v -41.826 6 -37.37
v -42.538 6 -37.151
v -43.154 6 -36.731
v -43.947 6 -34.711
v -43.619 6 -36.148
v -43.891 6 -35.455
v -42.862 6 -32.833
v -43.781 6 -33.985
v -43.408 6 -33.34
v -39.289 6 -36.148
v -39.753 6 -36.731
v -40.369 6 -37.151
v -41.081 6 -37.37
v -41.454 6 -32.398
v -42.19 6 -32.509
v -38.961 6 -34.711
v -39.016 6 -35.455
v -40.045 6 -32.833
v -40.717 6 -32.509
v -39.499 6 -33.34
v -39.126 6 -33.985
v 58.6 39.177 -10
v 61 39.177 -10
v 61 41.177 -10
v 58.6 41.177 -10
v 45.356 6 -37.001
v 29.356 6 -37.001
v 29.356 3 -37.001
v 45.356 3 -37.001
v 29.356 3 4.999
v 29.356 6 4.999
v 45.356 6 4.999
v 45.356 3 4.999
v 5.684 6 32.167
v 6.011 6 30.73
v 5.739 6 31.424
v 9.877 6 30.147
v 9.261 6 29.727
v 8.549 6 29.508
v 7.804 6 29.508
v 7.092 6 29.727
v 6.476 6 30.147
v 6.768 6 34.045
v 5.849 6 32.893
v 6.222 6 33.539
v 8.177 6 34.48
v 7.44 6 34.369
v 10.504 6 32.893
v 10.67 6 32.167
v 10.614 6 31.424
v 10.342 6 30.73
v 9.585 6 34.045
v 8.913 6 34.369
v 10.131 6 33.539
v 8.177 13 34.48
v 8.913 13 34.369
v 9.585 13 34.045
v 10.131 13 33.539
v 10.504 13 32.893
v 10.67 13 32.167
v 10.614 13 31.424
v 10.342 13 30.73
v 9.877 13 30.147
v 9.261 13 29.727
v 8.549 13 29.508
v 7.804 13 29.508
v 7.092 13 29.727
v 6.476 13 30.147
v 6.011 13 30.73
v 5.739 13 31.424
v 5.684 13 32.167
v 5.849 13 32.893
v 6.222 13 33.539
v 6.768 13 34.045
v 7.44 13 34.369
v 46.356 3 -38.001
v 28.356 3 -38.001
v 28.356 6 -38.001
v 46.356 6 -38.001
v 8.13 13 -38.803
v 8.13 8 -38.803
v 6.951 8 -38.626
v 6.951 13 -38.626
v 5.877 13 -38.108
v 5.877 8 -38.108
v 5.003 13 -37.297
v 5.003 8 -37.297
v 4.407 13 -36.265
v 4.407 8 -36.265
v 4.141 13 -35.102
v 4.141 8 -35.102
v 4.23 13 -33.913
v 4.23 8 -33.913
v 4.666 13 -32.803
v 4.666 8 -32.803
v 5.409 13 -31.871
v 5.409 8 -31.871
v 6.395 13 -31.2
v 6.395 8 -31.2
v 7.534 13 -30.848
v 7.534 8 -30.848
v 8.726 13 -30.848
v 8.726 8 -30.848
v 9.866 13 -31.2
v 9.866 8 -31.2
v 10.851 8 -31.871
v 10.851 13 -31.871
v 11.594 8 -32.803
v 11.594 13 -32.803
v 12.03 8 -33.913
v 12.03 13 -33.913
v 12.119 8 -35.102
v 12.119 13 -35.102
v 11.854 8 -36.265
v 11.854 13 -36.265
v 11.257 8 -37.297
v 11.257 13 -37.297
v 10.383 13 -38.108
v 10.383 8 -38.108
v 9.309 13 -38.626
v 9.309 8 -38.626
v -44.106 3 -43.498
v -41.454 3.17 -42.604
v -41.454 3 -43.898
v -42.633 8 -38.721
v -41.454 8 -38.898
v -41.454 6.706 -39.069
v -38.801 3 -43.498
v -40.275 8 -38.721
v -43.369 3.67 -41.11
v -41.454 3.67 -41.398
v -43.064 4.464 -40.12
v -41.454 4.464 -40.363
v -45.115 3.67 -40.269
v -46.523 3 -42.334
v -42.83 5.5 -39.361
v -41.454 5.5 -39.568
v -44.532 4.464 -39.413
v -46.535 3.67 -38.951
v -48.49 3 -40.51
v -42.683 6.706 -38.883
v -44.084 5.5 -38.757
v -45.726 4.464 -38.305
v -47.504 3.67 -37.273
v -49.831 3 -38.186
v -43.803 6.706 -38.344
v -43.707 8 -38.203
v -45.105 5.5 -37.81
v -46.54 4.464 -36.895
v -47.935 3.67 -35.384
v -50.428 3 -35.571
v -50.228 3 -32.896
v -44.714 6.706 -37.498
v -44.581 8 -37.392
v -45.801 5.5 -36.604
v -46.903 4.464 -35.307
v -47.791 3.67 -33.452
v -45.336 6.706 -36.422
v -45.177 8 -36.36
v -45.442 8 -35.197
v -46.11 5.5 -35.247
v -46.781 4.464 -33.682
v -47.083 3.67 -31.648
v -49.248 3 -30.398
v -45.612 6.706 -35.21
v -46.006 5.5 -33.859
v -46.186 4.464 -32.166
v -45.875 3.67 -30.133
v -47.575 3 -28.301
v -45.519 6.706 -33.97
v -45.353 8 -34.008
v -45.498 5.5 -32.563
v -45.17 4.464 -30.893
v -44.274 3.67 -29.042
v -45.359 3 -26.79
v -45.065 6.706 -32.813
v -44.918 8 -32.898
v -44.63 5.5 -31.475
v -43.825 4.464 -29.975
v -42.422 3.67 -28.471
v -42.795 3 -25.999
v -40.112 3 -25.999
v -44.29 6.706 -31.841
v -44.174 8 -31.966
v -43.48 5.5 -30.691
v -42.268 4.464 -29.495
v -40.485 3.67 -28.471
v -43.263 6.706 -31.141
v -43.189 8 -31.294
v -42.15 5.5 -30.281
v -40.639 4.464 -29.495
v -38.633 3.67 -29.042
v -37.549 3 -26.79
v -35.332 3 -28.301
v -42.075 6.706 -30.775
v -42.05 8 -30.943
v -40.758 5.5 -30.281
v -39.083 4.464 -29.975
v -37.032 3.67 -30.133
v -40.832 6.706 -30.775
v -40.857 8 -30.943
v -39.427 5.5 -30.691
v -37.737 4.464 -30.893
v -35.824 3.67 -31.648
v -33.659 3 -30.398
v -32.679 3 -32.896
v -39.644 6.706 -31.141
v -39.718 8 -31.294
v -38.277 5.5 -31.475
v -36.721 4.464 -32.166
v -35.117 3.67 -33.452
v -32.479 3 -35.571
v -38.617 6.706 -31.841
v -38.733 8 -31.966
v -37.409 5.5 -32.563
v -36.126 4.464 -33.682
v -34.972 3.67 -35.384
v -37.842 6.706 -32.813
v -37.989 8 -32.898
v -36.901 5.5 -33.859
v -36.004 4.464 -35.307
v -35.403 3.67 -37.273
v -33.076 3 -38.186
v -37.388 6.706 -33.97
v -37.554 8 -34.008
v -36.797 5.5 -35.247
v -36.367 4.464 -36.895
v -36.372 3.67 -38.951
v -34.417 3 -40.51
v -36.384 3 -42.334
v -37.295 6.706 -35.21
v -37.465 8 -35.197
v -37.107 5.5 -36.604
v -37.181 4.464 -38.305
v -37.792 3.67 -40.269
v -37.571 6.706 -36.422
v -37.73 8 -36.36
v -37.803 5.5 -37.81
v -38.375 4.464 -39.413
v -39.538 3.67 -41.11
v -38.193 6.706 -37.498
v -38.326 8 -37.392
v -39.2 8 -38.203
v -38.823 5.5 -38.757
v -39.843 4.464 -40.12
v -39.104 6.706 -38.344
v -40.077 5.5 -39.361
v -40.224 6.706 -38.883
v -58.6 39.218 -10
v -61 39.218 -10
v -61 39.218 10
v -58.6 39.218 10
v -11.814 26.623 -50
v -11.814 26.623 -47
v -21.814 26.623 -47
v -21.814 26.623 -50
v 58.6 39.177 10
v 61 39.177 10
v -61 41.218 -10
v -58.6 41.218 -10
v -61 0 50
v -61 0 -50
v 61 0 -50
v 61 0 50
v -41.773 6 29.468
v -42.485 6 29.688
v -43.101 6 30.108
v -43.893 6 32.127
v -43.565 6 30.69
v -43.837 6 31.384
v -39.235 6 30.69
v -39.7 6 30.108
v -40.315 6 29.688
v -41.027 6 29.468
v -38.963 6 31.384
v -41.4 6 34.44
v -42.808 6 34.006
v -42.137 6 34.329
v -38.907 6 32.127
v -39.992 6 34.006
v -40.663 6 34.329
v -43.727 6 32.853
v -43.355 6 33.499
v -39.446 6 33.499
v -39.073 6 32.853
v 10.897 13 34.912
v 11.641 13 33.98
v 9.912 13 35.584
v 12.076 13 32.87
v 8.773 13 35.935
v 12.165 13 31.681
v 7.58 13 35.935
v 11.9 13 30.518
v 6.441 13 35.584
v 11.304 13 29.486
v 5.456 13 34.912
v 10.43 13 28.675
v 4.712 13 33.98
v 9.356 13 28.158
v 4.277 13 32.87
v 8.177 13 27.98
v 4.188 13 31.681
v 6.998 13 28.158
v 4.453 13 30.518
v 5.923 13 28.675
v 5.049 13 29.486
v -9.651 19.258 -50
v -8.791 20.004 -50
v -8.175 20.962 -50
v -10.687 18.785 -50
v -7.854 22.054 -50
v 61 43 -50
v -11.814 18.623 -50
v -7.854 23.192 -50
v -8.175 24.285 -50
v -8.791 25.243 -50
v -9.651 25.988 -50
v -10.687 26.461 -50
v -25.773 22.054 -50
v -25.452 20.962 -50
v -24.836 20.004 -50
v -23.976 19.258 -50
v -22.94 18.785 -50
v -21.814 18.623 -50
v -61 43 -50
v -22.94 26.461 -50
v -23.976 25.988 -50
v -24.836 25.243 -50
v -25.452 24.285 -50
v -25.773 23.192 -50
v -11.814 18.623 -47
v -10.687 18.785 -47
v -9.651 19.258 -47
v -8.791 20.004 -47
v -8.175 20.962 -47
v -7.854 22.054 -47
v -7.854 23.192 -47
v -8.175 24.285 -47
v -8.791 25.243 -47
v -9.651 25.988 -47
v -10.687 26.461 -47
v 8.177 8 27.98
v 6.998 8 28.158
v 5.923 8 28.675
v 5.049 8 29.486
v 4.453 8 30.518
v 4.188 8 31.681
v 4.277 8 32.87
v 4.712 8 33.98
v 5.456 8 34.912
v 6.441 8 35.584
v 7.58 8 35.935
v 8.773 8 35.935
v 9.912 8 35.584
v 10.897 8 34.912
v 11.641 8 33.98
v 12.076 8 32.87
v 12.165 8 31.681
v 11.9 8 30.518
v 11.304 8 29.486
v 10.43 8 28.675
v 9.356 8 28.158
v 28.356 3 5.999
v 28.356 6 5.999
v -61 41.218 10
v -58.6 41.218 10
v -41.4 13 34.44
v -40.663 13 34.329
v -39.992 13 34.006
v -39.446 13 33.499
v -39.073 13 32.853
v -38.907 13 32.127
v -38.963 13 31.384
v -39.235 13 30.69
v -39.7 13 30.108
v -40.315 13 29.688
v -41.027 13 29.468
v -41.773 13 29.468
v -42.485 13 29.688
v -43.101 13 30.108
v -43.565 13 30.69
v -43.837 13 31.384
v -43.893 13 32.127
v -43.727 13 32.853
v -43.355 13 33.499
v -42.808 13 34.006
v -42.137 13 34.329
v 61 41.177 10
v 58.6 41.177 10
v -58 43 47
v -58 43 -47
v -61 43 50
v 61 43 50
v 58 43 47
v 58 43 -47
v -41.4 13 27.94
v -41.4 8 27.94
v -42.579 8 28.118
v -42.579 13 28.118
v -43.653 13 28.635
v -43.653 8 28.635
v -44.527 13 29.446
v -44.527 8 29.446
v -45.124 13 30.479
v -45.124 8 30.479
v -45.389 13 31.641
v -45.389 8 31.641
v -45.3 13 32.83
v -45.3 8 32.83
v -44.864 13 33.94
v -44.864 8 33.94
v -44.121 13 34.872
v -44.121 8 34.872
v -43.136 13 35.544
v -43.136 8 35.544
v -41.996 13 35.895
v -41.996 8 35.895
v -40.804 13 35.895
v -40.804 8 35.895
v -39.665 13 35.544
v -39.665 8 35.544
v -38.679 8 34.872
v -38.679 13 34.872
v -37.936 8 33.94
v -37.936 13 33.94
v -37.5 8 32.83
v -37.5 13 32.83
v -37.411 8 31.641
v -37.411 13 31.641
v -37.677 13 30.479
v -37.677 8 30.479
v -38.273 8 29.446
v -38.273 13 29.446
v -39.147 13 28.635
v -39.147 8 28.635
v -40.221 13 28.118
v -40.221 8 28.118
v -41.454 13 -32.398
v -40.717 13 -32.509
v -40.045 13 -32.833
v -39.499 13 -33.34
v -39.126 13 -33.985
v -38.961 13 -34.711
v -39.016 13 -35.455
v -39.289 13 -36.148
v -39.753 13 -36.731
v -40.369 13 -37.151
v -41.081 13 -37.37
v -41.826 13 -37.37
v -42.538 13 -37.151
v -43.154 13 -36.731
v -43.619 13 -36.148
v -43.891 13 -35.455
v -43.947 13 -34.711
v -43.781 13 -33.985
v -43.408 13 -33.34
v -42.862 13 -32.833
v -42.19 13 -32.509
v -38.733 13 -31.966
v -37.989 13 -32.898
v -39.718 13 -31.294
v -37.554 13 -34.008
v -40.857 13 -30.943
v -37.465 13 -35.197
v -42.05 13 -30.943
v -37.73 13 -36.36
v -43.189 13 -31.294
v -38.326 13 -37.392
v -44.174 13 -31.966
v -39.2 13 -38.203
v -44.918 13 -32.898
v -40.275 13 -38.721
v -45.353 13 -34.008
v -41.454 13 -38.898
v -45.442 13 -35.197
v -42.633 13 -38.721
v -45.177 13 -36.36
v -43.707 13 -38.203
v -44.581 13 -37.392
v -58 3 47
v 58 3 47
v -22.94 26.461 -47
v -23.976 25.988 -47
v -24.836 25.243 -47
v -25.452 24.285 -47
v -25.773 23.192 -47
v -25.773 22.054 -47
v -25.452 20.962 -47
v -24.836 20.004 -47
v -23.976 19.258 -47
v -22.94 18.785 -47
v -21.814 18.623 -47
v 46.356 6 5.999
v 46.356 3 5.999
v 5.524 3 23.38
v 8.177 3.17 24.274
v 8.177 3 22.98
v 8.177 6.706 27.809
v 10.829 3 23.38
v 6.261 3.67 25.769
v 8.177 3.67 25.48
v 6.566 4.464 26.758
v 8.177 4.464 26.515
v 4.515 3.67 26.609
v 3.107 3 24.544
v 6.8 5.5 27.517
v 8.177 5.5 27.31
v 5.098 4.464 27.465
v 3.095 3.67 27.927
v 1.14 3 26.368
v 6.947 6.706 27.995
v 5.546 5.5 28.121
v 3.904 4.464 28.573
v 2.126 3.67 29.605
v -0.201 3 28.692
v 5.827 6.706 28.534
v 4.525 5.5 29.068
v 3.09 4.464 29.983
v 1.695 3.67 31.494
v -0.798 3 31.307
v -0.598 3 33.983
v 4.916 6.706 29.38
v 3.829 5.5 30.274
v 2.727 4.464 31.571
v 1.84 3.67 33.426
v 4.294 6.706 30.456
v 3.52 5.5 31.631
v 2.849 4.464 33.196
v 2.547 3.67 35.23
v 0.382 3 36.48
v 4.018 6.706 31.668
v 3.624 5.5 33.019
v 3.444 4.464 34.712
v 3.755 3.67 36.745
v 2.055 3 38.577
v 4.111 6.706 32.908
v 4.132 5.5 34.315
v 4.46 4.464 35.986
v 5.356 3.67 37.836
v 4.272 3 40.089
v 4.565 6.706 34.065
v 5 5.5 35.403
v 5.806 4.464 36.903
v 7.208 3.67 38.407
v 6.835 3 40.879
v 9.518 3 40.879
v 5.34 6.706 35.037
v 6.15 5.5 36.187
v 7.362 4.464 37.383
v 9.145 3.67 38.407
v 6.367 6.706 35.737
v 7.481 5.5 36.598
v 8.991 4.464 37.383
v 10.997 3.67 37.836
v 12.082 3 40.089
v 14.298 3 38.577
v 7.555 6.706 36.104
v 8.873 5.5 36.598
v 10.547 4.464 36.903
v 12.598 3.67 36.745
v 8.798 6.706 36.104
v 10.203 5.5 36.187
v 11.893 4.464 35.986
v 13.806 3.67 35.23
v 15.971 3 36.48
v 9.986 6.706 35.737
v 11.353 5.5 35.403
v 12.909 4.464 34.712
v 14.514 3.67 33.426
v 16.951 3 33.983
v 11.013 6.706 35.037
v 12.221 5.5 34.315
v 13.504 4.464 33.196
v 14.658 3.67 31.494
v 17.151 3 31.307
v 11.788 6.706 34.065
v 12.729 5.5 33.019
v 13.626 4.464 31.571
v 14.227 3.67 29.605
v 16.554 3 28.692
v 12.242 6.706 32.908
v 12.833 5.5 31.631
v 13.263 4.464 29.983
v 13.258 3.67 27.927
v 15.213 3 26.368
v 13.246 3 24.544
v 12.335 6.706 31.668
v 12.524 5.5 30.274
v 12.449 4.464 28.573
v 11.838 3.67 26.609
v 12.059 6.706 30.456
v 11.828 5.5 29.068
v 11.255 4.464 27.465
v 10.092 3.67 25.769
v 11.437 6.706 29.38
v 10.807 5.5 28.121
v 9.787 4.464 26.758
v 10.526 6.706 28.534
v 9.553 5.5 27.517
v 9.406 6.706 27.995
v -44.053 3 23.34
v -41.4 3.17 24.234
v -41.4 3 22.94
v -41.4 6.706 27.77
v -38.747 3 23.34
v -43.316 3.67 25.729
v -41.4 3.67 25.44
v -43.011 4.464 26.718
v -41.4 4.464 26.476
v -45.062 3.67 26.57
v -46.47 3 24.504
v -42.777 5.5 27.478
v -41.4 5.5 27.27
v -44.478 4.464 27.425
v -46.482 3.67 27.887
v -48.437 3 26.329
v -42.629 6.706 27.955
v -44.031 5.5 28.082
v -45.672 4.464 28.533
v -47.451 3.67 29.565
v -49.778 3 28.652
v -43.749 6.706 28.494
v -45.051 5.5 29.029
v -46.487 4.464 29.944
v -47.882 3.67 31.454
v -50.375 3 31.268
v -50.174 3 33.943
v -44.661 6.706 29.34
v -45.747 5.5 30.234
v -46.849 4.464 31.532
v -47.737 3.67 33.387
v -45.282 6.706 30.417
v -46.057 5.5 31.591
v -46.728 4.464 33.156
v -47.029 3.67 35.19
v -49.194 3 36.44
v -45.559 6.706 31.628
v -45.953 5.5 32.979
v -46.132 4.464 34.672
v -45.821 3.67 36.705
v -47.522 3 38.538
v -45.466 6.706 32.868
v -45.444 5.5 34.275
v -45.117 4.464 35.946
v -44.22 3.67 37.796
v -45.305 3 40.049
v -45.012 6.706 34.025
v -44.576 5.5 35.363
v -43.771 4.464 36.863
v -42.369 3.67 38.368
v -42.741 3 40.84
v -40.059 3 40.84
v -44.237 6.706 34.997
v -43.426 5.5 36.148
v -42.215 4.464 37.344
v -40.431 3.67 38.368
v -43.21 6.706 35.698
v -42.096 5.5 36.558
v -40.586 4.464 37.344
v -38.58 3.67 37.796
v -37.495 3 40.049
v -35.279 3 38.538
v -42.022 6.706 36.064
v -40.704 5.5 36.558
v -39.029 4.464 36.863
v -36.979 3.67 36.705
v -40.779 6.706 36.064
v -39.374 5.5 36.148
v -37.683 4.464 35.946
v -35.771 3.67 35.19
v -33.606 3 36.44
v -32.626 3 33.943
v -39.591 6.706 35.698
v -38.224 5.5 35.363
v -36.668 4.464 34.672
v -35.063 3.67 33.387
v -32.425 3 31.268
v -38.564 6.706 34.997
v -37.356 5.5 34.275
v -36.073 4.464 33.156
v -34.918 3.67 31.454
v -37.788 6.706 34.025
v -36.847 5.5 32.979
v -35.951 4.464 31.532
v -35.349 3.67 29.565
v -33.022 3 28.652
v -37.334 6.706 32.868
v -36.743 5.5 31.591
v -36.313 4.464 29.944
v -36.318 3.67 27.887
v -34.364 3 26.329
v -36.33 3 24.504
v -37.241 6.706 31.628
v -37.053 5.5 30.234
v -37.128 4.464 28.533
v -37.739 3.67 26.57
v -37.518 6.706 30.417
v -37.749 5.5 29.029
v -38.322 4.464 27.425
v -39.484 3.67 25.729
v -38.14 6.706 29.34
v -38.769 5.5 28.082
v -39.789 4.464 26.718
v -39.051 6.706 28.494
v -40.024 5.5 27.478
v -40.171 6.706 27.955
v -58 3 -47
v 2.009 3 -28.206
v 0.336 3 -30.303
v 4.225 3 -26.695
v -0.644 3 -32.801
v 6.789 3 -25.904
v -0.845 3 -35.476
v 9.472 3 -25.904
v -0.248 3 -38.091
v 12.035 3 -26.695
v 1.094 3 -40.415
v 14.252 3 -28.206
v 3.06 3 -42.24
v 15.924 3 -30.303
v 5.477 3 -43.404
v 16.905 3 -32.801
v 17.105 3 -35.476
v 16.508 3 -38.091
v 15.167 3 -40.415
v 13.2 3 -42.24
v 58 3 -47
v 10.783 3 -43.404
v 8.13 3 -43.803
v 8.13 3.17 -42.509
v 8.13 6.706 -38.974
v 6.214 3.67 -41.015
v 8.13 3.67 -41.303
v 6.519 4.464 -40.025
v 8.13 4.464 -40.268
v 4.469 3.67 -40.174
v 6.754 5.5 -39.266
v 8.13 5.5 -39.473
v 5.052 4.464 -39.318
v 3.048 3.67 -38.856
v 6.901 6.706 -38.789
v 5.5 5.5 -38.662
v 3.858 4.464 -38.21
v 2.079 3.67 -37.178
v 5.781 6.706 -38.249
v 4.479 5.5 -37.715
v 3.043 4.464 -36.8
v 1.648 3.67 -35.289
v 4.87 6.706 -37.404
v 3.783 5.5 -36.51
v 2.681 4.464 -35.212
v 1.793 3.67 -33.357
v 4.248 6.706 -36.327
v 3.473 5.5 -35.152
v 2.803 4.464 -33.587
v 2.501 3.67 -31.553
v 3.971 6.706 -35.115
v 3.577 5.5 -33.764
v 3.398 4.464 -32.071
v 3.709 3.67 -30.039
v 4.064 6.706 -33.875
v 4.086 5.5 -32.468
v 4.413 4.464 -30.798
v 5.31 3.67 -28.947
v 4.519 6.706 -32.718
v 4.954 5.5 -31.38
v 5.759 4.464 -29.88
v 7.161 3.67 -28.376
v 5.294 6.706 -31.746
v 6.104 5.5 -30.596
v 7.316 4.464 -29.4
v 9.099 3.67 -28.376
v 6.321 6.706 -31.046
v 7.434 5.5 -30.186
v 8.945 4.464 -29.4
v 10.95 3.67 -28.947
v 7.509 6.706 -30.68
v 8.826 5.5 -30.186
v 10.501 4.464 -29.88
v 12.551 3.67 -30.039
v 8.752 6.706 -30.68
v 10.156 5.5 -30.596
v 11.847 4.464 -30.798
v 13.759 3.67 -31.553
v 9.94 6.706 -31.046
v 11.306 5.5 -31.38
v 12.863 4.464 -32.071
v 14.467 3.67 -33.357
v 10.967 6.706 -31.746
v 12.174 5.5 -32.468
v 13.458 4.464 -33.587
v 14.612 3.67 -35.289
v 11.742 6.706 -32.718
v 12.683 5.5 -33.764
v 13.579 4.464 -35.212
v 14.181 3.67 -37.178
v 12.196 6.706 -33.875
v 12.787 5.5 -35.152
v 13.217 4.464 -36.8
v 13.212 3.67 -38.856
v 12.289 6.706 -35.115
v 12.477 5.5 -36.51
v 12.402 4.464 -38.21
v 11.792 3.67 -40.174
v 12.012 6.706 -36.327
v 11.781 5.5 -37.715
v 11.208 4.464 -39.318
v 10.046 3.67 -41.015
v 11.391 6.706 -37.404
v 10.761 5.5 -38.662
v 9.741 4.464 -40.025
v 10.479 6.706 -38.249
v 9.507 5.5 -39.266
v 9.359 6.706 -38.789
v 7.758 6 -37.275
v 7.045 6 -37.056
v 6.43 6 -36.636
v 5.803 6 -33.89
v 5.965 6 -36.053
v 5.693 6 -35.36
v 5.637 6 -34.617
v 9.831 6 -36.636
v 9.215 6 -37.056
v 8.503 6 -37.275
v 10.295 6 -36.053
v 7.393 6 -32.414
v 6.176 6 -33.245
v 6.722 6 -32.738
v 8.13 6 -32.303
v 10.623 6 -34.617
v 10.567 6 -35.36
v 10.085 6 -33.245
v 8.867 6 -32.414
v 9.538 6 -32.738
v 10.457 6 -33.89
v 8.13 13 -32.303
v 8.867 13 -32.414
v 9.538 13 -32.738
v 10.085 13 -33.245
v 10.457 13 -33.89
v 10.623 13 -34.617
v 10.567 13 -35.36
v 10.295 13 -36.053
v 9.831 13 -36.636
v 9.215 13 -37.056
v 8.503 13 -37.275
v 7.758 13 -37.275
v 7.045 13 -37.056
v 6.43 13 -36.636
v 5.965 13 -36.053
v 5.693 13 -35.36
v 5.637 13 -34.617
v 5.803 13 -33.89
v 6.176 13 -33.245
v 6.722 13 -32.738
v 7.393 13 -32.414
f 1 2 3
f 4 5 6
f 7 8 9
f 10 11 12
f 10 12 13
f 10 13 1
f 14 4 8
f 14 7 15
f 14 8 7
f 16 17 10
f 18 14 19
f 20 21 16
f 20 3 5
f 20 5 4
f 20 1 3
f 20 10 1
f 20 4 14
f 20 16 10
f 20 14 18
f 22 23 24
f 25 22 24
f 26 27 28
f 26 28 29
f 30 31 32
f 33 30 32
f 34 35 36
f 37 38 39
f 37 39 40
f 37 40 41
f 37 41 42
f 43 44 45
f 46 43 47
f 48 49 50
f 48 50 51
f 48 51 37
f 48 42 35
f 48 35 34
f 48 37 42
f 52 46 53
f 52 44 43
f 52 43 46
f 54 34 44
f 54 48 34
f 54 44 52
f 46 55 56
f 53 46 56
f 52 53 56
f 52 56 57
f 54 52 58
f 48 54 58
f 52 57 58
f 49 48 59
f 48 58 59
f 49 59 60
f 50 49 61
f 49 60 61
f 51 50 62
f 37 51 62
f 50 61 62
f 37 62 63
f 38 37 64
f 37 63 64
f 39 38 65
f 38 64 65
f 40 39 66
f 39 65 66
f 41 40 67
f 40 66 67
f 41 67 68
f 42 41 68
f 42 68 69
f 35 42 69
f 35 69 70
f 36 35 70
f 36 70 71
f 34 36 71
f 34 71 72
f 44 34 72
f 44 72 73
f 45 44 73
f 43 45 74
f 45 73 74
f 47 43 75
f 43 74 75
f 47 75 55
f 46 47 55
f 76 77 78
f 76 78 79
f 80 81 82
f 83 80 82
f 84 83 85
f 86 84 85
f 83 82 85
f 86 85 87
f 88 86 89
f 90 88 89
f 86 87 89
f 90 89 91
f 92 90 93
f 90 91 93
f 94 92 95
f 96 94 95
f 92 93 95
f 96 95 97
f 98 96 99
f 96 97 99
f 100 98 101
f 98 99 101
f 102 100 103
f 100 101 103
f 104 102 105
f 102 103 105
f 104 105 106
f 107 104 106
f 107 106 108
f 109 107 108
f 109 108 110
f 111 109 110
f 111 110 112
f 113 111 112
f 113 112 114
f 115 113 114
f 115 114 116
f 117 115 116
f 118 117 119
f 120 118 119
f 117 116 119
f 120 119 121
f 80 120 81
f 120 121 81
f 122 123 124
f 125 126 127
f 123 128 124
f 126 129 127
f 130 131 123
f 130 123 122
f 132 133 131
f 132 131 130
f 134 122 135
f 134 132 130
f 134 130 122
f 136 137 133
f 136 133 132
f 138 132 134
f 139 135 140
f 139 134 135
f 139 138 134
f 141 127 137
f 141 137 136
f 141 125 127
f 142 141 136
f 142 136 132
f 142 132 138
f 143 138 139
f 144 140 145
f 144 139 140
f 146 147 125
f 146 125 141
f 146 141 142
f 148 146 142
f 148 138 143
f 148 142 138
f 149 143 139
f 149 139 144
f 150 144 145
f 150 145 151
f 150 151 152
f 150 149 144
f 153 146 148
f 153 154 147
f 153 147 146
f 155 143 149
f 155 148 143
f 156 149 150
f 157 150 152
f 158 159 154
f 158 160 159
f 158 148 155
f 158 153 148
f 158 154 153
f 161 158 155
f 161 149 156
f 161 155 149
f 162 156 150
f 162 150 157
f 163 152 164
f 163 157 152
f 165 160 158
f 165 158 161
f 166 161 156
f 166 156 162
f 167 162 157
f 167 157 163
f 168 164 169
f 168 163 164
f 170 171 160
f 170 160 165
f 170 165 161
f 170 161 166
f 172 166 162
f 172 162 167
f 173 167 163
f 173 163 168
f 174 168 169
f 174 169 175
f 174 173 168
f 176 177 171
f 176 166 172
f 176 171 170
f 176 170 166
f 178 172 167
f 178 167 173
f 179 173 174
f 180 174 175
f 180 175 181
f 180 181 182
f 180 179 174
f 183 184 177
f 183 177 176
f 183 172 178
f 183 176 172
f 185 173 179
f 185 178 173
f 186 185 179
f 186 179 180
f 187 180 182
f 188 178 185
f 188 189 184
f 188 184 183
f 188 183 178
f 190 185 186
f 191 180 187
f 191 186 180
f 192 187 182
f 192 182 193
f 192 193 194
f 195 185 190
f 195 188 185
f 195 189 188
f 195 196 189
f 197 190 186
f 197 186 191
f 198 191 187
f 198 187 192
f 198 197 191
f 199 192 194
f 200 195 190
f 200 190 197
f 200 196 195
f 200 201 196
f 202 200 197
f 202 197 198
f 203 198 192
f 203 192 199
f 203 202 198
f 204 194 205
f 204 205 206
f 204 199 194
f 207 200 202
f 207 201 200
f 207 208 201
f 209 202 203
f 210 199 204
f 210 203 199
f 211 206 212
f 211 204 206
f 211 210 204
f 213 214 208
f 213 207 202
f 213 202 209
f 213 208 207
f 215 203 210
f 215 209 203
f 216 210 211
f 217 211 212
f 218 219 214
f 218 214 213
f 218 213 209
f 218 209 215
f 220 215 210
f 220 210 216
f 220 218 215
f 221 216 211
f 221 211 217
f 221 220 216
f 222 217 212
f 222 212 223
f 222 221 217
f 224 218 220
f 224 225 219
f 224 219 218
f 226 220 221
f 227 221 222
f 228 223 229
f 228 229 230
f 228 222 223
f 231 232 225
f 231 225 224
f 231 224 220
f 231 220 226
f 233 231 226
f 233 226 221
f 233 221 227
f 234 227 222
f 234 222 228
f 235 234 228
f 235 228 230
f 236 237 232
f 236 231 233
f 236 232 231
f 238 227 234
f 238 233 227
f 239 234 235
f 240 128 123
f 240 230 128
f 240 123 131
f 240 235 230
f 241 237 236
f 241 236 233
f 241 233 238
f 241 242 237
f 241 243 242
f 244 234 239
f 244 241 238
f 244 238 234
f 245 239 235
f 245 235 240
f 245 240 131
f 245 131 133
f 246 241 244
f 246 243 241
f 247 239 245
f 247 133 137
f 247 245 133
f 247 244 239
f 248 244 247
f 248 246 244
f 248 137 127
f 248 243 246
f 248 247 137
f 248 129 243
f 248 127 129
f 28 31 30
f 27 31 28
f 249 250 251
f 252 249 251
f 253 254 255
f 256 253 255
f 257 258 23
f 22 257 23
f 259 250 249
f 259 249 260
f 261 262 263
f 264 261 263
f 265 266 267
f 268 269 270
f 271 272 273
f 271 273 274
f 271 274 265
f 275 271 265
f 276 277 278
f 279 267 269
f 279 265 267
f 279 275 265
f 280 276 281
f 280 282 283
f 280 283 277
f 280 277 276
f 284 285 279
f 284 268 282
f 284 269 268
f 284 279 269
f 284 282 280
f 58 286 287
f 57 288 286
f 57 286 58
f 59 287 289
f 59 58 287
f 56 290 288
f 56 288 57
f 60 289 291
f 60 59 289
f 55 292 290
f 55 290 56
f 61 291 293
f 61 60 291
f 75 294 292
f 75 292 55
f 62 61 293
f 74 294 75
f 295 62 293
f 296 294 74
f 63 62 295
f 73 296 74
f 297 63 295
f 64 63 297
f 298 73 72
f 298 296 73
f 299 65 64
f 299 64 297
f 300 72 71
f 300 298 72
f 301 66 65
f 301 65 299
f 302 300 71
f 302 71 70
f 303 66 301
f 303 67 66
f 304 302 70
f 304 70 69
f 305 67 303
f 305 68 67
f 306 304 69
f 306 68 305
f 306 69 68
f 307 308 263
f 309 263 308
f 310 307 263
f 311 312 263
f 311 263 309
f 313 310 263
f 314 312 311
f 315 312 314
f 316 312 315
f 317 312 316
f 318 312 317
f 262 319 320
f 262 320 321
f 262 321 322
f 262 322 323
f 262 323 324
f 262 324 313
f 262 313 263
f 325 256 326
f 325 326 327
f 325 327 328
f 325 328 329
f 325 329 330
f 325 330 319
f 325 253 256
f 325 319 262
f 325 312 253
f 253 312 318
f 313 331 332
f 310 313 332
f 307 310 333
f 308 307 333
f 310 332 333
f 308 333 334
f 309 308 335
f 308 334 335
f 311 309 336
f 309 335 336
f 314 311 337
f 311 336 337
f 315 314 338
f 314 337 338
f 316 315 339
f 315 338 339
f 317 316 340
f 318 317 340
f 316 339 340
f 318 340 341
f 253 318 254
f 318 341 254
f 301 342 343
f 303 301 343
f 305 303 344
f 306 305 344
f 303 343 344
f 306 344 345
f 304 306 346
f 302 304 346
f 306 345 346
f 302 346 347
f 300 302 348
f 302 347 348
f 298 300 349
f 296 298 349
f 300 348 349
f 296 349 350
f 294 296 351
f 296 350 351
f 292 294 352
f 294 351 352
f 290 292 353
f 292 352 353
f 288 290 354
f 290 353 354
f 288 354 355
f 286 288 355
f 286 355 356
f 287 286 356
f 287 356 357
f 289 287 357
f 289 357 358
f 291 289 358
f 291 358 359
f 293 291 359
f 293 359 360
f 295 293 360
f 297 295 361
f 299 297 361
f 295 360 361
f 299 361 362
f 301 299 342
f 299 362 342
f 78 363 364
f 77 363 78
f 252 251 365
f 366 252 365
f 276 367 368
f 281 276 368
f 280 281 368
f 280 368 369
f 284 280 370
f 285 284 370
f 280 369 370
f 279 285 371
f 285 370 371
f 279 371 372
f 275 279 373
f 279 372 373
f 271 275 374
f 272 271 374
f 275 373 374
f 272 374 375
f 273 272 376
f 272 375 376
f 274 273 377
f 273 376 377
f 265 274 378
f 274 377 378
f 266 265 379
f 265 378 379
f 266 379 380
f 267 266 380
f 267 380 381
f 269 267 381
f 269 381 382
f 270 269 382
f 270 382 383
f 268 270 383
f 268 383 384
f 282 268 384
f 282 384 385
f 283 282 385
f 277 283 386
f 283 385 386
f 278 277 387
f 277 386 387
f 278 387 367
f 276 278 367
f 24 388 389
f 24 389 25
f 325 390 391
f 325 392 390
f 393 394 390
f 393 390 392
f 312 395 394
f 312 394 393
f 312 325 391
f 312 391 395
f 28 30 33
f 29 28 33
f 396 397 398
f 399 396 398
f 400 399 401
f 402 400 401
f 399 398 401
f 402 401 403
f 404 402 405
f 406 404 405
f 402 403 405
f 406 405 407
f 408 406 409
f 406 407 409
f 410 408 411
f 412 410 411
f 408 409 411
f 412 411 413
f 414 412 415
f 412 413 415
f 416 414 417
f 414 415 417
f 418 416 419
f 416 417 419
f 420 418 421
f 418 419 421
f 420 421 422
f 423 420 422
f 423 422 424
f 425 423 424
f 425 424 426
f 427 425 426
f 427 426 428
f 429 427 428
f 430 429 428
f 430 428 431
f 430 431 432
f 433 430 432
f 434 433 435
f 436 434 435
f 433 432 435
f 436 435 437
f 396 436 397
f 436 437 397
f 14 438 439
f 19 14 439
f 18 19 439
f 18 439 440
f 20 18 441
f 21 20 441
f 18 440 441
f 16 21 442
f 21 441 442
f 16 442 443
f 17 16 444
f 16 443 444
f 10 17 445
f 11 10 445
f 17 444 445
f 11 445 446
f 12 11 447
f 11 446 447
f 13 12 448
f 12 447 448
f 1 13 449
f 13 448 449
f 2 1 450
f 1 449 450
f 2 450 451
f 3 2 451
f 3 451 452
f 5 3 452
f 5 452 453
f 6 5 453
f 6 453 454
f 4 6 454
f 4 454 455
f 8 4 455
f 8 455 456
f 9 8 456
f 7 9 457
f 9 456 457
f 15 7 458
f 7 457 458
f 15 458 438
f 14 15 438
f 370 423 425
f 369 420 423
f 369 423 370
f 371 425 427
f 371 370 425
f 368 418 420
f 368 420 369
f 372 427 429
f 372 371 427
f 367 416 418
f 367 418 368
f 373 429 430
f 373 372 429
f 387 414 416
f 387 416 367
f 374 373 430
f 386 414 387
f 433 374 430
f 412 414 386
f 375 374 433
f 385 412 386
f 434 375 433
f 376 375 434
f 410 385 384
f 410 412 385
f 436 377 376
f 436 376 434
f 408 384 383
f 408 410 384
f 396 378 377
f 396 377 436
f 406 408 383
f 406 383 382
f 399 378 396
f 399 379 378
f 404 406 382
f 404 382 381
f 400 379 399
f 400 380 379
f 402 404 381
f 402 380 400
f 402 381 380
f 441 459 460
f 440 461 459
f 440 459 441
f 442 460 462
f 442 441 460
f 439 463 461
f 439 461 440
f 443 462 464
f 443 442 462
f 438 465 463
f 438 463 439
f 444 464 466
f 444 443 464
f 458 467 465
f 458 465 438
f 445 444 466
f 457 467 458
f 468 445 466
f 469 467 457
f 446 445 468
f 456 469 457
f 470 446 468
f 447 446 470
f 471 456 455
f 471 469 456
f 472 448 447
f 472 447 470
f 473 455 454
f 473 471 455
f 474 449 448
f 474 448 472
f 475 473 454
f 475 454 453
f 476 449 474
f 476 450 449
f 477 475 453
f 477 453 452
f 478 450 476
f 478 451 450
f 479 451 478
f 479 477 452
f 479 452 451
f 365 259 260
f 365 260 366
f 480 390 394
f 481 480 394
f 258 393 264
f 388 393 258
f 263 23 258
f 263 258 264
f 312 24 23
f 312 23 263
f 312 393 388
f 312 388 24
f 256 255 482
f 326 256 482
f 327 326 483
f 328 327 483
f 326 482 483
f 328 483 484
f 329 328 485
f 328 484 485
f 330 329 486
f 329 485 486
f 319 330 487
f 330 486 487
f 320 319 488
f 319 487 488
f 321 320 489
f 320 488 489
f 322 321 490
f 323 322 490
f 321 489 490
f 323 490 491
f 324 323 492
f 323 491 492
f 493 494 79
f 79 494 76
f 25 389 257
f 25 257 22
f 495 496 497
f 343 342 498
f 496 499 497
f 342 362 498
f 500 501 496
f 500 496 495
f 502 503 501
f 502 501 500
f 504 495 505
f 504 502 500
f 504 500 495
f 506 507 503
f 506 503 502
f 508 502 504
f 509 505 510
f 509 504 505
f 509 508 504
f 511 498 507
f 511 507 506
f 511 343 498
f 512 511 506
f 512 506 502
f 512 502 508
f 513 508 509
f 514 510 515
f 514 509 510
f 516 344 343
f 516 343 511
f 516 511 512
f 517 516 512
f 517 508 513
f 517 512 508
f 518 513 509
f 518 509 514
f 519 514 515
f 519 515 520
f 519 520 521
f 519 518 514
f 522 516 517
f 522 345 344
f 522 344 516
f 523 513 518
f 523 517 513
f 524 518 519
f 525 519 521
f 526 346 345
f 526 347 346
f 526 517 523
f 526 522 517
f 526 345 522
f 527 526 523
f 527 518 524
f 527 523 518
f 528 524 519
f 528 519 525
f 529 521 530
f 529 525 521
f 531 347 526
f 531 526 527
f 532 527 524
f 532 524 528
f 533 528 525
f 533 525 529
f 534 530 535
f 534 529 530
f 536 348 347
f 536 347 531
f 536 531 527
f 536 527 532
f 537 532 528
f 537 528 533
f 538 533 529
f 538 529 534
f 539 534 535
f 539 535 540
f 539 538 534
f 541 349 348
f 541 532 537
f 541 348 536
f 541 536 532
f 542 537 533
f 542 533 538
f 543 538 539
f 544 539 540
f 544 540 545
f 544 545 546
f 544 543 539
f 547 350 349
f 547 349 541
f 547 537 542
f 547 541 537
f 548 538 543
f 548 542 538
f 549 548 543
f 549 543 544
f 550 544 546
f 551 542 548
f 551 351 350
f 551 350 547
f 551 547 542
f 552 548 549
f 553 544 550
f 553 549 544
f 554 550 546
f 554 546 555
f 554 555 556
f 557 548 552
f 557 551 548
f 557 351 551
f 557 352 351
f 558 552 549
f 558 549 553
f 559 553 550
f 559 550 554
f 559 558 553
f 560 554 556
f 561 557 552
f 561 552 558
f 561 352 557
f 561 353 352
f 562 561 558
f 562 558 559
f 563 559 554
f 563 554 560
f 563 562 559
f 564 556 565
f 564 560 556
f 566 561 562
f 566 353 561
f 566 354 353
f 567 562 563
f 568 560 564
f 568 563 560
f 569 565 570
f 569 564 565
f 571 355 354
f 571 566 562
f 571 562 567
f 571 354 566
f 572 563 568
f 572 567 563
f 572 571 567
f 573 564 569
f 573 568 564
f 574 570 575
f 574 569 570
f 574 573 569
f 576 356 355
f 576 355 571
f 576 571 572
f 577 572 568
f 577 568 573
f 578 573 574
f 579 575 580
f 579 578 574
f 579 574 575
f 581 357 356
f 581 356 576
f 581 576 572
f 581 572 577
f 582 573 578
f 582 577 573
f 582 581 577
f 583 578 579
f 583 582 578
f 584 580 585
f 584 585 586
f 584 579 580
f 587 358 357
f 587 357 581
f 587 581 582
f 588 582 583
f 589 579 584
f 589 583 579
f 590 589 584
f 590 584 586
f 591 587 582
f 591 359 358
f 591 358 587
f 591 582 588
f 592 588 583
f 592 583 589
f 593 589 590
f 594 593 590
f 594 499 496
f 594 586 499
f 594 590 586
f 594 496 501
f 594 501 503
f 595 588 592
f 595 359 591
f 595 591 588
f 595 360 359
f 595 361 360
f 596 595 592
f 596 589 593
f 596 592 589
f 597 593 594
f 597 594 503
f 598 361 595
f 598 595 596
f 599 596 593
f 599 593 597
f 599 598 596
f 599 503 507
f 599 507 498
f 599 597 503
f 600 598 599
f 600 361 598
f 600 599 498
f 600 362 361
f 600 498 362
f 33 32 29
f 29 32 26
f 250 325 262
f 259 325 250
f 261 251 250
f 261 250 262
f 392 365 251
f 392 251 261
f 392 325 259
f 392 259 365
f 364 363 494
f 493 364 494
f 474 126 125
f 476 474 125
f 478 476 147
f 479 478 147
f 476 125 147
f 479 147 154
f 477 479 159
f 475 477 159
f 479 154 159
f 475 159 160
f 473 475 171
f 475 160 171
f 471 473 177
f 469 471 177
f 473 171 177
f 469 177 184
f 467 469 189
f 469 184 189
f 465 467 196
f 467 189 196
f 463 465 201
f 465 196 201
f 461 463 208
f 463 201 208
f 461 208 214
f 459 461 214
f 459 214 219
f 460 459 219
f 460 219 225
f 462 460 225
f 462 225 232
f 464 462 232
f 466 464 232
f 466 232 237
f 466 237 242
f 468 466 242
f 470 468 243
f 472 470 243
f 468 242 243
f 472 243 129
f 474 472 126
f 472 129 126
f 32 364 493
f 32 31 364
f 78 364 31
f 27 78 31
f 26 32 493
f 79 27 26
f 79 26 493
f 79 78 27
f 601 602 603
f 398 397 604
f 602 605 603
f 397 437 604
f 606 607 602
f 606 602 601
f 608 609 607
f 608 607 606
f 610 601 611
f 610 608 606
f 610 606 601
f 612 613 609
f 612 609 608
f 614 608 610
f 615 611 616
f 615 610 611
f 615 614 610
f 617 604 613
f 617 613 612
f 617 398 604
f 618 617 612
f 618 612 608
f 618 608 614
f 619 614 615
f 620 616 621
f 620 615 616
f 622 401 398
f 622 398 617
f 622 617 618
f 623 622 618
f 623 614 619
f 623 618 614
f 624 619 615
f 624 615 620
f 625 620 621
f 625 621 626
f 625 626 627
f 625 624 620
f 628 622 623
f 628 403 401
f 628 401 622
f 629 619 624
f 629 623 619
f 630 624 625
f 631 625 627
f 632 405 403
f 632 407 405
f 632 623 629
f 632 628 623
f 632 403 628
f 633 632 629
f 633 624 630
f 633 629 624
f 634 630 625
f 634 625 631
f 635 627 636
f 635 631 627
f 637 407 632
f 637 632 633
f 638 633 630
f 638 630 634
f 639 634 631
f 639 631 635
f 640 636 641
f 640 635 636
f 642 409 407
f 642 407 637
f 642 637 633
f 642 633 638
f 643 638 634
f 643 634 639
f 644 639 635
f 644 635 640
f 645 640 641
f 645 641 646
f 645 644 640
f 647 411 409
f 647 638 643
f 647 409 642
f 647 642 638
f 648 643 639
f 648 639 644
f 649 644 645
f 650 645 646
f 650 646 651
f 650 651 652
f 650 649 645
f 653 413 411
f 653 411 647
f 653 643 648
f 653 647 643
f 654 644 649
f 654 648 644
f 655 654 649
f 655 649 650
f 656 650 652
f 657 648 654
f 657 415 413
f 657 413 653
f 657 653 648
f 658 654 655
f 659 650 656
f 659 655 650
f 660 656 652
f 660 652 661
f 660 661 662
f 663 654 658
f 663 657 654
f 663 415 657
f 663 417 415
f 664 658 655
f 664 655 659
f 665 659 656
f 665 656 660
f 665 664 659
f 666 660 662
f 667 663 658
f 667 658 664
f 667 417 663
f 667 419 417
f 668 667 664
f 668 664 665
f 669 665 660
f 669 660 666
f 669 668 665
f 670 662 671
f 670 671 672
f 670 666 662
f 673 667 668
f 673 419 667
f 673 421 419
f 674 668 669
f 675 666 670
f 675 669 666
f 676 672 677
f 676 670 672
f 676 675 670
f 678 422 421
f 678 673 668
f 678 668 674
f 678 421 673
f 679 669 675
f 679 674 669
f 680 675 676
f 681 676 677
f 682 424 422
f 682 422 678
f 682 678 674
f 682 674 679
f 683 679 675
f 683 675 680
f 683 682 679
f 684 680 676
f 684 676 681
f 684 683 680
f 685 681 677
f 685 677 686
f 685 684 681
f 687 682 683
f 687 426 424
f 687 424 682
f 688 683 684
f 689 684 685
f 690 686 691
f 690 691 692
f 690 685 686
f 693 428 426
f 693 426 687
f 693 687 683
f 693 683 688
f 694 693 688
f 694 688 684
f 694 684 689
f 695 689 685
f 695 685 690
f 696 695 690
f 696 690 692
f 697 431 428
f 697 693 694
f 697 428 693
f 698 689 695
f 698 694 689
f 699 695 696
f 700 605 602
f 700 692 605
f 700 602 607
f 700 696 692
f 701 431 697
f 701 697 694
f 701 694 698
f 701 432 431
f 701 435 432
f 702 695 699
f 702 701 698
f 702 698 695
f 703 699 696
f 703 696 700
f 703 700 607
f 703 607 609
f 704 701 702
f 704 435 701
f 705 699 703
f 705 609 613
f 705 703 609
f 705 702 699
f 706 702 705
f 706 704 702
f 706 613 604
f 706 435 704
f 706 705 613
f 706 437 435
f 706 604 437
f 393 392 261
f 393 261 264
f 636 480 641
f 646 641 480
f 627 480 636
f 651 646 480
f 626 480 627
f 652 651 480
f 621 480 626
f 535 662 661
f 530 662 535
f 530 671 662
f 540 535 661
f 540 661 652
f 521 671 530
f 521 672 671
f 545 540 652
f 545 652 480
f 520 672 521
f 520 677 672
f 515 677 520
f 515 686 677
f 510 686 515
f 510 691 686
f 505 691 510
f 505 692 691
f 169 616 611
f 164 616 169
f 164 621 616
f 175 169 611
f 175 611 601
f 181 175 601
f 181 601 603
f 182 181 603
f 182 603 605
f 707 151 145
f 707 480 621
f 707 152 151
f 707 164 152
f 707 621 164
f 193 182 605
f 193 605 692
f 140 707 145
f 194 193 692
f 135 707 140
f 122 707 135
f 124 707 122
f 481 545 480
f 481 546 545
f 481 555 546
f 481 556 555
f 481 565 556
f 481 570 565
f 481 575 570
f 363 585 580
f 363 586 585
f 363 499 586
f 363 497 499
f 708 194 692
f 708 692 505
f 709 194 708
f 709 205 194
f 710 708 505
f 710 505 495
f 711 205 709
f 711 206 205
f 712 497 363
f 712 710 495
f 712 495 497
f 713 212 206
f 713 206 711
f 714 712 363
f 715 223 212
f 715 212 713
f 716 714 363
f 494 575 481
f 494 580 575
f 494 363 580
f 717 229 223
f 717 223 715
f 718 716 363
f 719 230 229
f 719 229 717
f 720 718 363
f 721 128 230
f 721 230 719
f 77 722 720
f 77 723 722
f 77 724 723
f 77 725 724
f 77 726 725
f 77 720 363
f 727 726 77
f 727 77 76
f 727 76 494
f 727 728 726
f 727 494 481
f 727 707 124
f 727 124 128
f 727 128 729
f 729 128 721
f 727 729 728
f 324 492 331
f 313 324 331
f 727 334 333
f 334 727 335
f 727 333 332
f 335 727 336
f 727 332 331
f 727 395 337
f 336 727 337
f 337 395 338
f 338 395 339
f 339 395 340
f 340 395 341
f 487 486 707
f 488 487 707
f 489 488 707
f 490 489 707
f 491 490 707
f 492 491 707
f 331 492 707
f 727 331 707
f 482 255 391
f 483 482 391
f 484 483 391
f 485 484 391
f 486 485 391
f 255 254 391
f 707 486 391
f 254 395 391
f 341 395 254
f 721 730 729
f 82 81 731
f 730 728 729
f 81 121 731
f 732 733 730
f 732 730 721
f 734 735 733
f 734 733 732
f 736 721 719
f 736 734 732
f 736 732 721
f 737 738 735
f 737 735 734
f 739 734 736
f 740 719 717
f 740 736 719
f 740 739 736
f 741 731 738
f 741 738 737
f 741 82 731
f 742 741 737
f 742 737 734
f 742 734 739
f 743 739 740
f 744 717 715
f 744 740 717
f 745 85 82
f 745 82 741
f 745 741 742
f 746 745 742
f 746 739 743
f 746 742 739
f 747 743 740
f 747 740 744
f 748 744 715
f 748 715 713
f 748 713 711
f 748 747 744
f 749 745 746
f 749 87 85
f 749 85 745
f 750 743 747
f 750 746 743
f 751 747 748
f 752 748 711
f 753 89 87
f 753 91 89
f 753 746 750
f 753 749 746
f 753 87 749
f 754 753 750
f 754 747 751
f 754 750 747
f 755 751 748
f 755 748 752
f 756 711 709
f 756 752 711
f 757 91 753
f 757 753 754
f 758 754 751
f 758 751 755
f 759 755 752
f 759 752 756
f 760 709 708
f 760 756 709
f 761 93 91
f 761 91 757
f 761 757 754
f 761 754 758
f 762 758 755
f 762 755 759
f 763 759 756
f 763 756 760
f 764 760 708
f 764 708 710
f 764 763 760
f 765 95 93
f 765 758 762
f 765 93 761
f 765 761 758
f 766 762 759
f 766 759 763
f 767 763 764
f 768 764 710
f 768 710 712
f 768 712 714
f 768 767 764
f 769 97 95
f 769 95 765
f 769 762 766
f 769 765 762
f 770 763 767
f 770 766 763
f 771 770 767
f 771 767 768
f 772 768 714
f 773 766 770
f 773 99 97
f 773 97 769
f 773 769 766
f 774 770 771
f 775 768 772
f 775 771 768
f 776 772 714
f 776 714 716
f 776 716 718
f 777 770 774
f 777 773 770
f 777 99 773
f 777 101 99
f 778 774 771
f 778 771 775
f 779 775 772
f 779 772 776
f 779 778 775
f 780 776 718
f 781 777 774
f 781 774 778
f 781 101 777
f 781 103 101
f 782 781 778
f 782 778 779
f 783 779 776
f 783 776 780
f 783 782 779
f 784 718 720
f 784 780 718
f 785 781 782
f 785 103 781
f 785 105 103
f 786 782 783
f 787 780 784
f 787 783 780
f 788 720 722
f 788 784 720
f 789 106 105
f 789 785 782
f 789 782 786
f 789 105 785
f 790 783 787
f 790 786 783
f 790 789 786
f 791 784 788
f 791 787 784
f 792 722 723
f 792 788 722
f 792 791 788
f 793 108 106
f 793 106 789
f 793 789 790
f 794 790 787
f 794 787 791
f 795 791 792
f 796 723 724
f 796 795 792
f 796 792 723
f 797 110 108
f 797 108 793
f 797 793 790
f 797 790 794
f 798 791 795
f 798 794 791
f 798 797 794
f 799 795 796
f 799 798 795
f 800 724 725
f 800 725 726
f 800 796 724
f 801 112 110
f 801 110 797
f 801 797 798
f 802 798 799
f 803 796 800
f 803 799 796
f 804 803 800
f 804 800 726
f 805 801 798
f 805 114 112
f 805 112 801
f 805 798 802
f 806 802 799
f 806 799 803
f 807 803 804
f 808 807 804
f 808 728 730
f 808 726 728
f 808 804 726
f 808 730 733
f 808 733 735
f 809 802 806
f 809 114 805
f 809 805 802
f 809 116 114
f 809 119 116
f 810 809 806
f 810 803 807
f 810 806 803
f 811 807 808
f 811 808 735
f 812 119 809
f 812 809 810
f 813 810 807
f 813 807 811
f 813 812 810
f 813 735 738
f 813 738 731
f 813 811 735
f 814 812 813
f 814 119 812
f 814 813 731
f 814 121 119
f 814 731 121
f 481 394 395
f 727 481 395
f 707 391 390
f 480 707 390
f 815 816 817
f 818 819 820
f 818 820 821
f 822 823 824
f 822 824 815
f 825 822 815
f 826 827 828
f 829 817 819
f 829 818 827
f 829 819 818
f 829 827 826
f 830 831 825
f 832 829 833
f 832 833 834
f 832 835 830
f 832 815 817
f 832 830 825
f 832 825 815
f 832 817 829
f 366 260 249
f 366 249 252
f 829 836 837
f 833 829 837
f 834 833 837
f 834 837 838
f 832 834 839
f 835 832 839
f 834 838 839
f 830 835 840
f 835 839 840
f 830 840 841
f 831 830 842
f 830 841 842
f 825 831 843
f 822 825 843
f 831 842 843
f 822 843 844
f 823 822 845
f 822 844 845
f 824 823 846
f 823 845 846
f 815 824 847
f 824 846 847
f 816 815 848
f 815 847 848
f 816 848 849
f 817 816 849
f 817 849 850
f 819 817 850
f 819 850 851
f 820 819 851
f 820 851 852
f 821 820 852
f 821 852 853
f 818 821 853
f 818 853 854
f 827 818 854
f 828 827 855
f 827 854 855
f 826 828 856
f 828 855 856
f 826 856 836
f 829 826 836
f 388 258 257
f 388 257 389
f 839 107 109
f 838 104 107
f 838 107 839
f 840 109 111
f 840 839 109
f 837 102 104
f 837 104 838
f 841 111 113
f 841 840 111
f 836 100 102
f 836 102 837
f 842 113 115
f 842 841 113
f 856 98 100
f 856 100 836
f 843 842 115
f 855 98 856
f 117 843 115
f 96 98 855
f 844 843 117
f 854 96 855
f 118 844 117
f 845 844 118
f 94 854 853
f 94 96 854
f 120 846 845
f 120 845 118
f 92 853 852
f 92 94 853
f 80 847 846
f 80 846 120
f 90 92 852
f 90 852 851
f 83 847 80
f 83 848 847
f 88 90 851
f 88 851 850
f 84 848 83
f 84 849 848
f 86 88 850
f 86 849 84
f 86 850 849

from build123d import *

# Parameters (mm, degrees)
SKETCH1_W           = 122
SKETCH1_H           = 100
BOSS_EXTRUDE1_DEPTH = 3
SKETCH2_W           = 122
SKETCH2_H           = 100
BOSS_EXTRUDE2_DEPTH = 5
SHELL1_T            = -3
SKETCH5_W           = 20
SKETCH5_H           = 2
CUT_EXTRUDE1_DEPTH  = 2.4
SKETCH6_W           = 20
SKETCH6_H           = 2
CUT_EXTRUDE2_DEPTH  = 2.4
SKETCH7_R           = 4
BOSS_EXTRUDE3_DEPTH = 10
SKETCH11_R          = 2.5
CUT_EXTRUDE5_DEPTH  = 7
CUT_EXTRUDE6_DEPTH  = 3
SKETCH13_W          = 18
SKETCH13_H          = 44
BOSS_EXTRUDE5_DEPTH = 3
SKETCH14_W          = 16
SKETCH14_H          = 42
CUT_EXTRUDE7_DEPTH  = 3
FILLET1_R           = 5


with BuildPart() as part:
    # Sketch1 → Boss-Extrude1 (new body)
    with BuildSketch(Plane(origin=(0, 0, 0), x_dir=(1, 0, 0), z_dir=(0, 1, 0))):
        Rectangle(SKETCH1_W, SKETCH1_H)
    extrude(amount=BOSS_EXTRUDE1_DEPTH)



with BuildPart() as body_2:
    # Sketch2 → Boss-Extrude2 (new body)
    with BuildSketch(Plane(origin=(0, 38, 0), x_dir=(1, 0, 0), z_dir=(0, 1, 0))):
        Rectangle(SKETCH2_W, SKETCH2_H)
    extrude(amount=BOSS_EXTRUDE2_DEPTH)


with BuildPart() as part_1:
    add(part.part)

    add(body_2.part)  # loft1 joins it to this body
    # loft from a face of the part (loft1)
    loft([part_1.faces().sort_by_distance((0, 3, 0))[0], part_1.faces().sort_by_distance((0, 38, 0))[0]])

    # Shell1
    shell1_openings = [part_1.faces().sort_by_distance(p)[0] for p in [
        (0, 43, 0),
    ]]
    offset(amount=SHELL1_T, openings=shell1_openings, kind=Kind.INTERSECTION)

    # Sketch5 → Cut-Extrude1 (cut)
    with BuildSketch(Plane.ZY.offset(61)):
        with Locations((0, 40.21846081)):
            Rectangle(SKETCH5_W, SKETCH5_H)
    extrude(amount=-CUT_EXTRUDE1_DEPTH, mode=Mode.SUBTRACT)

    # Sketch6 → Cut-Extrude2 (cut)
    with BuildSketch(Plane(origin=(61, 0, 0), x_dir=(0, 0, -1), z_dir=(1, 0, 0))):
        with Locations((0, 40.177064429)):
            Rectangle(SKETCH6_W, SKETCH6_H)
    extrude(amount=-CUT_EXTRUDE2_DEPTH, mode=Mode.SUBTRACT)

    # Sketch7 → Boss-Extrude3 (add)
    with BuildSketch(Plane(origin=(0, 3, 0), x_dir=(1, 0, 0), z_dir=(0, 1, 0))):
        with Locations(Location((-41.453573848, 34.898312462, 0), (0, 0, 90))):
            Circle(SKETCH7_R)
        with Locations(Location((8.130154931, 34.803413618, 0), (0, 0, 90))):
            Circle(SKETCH7_R)
        with Locations(Location((8.176549105, -31.979822672, 0), (0, 0, 90))):
            Circle(SKETCH7_R)
        with Locations(Location((-41.400089419, -31.94013199, 0), (0, 0, 90))):
            Circle(SKETCH7_R)
    extrude(amount=BOSS_EXTRUDE3_DEPTH)

    # Sketch11 → Cut-Extrude5 (cut)
    with BuildSketch(Plane(origin=(0, 13, 0), x_dir=(1, 0, 0), z_dir=(0, 1, 0))):
        with Locations(Location((-41.400089419, -31.94013199, 0), (0, 0, 270))):
            Circle(SKETCH11_R)
        with Locations(Location((8.176549105, -31.979822672, 0), (0, 0, 270))):
            Circle(SKETCH11_R)
        with Locations(Location((8.130154931, 34.803413618, 0), (0, 0, 270))):
            Circle(SKETCH11_R)
        with Locations(Location((-41.453573848, 34.898312462, 0), (0, 0, 270))):
            Circle(SKETCH11_R)
    extrude(amount=-CUT_EXTRUDE5_DEPTH, mode=Mode.SUBTRACT)

    # Sketch12 → Cut-Extrude6 (cut)
    with BuildSketch(Plane.XY.offset(-47)):
        with BuildLine():
            Line((-21.813500173, 18.623177144), (-11.813500173, 18.623177144))
            ThreePointArc((-11.813500173, 18.623177144), (-7.813500173, 22.623177144), (-11.813500173, 26.623177144))
            Line((-11.813500173, 26.623177144), (-21.813500173, 26.623177144))
            ThreePointArc((-21.813500173, 26.623177144), (-25.813500173, 22.623177144), (-21.813500173, 18.623177144))
        make_face()
    extrude(amount=-CUT_EXTRUDE6_DEPTH, mode=Mode.SUBTRACT)

    # Sketch13 → Boss-Extrude5 (add)
    with BuildSketch(Plane(origin=(0, 3, 0), x_dir=(1, 0, 0), z_dir=(0, 1, 0))):
        with Locations((37.356436199, 16.000571449)):
            Rectangle(SKETCH13_W, SKETCH13_H)
    extrude(amount=BOSS_EXTRUDE5_DEPTH)

    # Sketch14 → Cut-Extrude7 (cut)
    with BuildSketch(Plane(origin=(0, 6, 0), x_dir=(1, 0, 0), z_dir=(0, 1, 0))):
        with Locations((37.356436199, 16.000571449)):
            Rectangle(SKETCH14_W, SKETCH14_H)
    extrude(amount=-CUT_EXTRUDE7_DEPTH, mode=Mode.SUBTRACT)

    # Fillet1
    fillet1_edges = [part_1.edges().sort_by_distance(p)[0] for p in [
        (-41.453573848, 3, -30.898312462),
        (8.130154931, 3, -30.803413618),
        (8.176549105, 3, 35.979822672),
        (-41.400089419, 3, 35.94013199),
    ]]
    fillet(fillet1_edges, radius=FILLET1_R)


solid = part_1.part
